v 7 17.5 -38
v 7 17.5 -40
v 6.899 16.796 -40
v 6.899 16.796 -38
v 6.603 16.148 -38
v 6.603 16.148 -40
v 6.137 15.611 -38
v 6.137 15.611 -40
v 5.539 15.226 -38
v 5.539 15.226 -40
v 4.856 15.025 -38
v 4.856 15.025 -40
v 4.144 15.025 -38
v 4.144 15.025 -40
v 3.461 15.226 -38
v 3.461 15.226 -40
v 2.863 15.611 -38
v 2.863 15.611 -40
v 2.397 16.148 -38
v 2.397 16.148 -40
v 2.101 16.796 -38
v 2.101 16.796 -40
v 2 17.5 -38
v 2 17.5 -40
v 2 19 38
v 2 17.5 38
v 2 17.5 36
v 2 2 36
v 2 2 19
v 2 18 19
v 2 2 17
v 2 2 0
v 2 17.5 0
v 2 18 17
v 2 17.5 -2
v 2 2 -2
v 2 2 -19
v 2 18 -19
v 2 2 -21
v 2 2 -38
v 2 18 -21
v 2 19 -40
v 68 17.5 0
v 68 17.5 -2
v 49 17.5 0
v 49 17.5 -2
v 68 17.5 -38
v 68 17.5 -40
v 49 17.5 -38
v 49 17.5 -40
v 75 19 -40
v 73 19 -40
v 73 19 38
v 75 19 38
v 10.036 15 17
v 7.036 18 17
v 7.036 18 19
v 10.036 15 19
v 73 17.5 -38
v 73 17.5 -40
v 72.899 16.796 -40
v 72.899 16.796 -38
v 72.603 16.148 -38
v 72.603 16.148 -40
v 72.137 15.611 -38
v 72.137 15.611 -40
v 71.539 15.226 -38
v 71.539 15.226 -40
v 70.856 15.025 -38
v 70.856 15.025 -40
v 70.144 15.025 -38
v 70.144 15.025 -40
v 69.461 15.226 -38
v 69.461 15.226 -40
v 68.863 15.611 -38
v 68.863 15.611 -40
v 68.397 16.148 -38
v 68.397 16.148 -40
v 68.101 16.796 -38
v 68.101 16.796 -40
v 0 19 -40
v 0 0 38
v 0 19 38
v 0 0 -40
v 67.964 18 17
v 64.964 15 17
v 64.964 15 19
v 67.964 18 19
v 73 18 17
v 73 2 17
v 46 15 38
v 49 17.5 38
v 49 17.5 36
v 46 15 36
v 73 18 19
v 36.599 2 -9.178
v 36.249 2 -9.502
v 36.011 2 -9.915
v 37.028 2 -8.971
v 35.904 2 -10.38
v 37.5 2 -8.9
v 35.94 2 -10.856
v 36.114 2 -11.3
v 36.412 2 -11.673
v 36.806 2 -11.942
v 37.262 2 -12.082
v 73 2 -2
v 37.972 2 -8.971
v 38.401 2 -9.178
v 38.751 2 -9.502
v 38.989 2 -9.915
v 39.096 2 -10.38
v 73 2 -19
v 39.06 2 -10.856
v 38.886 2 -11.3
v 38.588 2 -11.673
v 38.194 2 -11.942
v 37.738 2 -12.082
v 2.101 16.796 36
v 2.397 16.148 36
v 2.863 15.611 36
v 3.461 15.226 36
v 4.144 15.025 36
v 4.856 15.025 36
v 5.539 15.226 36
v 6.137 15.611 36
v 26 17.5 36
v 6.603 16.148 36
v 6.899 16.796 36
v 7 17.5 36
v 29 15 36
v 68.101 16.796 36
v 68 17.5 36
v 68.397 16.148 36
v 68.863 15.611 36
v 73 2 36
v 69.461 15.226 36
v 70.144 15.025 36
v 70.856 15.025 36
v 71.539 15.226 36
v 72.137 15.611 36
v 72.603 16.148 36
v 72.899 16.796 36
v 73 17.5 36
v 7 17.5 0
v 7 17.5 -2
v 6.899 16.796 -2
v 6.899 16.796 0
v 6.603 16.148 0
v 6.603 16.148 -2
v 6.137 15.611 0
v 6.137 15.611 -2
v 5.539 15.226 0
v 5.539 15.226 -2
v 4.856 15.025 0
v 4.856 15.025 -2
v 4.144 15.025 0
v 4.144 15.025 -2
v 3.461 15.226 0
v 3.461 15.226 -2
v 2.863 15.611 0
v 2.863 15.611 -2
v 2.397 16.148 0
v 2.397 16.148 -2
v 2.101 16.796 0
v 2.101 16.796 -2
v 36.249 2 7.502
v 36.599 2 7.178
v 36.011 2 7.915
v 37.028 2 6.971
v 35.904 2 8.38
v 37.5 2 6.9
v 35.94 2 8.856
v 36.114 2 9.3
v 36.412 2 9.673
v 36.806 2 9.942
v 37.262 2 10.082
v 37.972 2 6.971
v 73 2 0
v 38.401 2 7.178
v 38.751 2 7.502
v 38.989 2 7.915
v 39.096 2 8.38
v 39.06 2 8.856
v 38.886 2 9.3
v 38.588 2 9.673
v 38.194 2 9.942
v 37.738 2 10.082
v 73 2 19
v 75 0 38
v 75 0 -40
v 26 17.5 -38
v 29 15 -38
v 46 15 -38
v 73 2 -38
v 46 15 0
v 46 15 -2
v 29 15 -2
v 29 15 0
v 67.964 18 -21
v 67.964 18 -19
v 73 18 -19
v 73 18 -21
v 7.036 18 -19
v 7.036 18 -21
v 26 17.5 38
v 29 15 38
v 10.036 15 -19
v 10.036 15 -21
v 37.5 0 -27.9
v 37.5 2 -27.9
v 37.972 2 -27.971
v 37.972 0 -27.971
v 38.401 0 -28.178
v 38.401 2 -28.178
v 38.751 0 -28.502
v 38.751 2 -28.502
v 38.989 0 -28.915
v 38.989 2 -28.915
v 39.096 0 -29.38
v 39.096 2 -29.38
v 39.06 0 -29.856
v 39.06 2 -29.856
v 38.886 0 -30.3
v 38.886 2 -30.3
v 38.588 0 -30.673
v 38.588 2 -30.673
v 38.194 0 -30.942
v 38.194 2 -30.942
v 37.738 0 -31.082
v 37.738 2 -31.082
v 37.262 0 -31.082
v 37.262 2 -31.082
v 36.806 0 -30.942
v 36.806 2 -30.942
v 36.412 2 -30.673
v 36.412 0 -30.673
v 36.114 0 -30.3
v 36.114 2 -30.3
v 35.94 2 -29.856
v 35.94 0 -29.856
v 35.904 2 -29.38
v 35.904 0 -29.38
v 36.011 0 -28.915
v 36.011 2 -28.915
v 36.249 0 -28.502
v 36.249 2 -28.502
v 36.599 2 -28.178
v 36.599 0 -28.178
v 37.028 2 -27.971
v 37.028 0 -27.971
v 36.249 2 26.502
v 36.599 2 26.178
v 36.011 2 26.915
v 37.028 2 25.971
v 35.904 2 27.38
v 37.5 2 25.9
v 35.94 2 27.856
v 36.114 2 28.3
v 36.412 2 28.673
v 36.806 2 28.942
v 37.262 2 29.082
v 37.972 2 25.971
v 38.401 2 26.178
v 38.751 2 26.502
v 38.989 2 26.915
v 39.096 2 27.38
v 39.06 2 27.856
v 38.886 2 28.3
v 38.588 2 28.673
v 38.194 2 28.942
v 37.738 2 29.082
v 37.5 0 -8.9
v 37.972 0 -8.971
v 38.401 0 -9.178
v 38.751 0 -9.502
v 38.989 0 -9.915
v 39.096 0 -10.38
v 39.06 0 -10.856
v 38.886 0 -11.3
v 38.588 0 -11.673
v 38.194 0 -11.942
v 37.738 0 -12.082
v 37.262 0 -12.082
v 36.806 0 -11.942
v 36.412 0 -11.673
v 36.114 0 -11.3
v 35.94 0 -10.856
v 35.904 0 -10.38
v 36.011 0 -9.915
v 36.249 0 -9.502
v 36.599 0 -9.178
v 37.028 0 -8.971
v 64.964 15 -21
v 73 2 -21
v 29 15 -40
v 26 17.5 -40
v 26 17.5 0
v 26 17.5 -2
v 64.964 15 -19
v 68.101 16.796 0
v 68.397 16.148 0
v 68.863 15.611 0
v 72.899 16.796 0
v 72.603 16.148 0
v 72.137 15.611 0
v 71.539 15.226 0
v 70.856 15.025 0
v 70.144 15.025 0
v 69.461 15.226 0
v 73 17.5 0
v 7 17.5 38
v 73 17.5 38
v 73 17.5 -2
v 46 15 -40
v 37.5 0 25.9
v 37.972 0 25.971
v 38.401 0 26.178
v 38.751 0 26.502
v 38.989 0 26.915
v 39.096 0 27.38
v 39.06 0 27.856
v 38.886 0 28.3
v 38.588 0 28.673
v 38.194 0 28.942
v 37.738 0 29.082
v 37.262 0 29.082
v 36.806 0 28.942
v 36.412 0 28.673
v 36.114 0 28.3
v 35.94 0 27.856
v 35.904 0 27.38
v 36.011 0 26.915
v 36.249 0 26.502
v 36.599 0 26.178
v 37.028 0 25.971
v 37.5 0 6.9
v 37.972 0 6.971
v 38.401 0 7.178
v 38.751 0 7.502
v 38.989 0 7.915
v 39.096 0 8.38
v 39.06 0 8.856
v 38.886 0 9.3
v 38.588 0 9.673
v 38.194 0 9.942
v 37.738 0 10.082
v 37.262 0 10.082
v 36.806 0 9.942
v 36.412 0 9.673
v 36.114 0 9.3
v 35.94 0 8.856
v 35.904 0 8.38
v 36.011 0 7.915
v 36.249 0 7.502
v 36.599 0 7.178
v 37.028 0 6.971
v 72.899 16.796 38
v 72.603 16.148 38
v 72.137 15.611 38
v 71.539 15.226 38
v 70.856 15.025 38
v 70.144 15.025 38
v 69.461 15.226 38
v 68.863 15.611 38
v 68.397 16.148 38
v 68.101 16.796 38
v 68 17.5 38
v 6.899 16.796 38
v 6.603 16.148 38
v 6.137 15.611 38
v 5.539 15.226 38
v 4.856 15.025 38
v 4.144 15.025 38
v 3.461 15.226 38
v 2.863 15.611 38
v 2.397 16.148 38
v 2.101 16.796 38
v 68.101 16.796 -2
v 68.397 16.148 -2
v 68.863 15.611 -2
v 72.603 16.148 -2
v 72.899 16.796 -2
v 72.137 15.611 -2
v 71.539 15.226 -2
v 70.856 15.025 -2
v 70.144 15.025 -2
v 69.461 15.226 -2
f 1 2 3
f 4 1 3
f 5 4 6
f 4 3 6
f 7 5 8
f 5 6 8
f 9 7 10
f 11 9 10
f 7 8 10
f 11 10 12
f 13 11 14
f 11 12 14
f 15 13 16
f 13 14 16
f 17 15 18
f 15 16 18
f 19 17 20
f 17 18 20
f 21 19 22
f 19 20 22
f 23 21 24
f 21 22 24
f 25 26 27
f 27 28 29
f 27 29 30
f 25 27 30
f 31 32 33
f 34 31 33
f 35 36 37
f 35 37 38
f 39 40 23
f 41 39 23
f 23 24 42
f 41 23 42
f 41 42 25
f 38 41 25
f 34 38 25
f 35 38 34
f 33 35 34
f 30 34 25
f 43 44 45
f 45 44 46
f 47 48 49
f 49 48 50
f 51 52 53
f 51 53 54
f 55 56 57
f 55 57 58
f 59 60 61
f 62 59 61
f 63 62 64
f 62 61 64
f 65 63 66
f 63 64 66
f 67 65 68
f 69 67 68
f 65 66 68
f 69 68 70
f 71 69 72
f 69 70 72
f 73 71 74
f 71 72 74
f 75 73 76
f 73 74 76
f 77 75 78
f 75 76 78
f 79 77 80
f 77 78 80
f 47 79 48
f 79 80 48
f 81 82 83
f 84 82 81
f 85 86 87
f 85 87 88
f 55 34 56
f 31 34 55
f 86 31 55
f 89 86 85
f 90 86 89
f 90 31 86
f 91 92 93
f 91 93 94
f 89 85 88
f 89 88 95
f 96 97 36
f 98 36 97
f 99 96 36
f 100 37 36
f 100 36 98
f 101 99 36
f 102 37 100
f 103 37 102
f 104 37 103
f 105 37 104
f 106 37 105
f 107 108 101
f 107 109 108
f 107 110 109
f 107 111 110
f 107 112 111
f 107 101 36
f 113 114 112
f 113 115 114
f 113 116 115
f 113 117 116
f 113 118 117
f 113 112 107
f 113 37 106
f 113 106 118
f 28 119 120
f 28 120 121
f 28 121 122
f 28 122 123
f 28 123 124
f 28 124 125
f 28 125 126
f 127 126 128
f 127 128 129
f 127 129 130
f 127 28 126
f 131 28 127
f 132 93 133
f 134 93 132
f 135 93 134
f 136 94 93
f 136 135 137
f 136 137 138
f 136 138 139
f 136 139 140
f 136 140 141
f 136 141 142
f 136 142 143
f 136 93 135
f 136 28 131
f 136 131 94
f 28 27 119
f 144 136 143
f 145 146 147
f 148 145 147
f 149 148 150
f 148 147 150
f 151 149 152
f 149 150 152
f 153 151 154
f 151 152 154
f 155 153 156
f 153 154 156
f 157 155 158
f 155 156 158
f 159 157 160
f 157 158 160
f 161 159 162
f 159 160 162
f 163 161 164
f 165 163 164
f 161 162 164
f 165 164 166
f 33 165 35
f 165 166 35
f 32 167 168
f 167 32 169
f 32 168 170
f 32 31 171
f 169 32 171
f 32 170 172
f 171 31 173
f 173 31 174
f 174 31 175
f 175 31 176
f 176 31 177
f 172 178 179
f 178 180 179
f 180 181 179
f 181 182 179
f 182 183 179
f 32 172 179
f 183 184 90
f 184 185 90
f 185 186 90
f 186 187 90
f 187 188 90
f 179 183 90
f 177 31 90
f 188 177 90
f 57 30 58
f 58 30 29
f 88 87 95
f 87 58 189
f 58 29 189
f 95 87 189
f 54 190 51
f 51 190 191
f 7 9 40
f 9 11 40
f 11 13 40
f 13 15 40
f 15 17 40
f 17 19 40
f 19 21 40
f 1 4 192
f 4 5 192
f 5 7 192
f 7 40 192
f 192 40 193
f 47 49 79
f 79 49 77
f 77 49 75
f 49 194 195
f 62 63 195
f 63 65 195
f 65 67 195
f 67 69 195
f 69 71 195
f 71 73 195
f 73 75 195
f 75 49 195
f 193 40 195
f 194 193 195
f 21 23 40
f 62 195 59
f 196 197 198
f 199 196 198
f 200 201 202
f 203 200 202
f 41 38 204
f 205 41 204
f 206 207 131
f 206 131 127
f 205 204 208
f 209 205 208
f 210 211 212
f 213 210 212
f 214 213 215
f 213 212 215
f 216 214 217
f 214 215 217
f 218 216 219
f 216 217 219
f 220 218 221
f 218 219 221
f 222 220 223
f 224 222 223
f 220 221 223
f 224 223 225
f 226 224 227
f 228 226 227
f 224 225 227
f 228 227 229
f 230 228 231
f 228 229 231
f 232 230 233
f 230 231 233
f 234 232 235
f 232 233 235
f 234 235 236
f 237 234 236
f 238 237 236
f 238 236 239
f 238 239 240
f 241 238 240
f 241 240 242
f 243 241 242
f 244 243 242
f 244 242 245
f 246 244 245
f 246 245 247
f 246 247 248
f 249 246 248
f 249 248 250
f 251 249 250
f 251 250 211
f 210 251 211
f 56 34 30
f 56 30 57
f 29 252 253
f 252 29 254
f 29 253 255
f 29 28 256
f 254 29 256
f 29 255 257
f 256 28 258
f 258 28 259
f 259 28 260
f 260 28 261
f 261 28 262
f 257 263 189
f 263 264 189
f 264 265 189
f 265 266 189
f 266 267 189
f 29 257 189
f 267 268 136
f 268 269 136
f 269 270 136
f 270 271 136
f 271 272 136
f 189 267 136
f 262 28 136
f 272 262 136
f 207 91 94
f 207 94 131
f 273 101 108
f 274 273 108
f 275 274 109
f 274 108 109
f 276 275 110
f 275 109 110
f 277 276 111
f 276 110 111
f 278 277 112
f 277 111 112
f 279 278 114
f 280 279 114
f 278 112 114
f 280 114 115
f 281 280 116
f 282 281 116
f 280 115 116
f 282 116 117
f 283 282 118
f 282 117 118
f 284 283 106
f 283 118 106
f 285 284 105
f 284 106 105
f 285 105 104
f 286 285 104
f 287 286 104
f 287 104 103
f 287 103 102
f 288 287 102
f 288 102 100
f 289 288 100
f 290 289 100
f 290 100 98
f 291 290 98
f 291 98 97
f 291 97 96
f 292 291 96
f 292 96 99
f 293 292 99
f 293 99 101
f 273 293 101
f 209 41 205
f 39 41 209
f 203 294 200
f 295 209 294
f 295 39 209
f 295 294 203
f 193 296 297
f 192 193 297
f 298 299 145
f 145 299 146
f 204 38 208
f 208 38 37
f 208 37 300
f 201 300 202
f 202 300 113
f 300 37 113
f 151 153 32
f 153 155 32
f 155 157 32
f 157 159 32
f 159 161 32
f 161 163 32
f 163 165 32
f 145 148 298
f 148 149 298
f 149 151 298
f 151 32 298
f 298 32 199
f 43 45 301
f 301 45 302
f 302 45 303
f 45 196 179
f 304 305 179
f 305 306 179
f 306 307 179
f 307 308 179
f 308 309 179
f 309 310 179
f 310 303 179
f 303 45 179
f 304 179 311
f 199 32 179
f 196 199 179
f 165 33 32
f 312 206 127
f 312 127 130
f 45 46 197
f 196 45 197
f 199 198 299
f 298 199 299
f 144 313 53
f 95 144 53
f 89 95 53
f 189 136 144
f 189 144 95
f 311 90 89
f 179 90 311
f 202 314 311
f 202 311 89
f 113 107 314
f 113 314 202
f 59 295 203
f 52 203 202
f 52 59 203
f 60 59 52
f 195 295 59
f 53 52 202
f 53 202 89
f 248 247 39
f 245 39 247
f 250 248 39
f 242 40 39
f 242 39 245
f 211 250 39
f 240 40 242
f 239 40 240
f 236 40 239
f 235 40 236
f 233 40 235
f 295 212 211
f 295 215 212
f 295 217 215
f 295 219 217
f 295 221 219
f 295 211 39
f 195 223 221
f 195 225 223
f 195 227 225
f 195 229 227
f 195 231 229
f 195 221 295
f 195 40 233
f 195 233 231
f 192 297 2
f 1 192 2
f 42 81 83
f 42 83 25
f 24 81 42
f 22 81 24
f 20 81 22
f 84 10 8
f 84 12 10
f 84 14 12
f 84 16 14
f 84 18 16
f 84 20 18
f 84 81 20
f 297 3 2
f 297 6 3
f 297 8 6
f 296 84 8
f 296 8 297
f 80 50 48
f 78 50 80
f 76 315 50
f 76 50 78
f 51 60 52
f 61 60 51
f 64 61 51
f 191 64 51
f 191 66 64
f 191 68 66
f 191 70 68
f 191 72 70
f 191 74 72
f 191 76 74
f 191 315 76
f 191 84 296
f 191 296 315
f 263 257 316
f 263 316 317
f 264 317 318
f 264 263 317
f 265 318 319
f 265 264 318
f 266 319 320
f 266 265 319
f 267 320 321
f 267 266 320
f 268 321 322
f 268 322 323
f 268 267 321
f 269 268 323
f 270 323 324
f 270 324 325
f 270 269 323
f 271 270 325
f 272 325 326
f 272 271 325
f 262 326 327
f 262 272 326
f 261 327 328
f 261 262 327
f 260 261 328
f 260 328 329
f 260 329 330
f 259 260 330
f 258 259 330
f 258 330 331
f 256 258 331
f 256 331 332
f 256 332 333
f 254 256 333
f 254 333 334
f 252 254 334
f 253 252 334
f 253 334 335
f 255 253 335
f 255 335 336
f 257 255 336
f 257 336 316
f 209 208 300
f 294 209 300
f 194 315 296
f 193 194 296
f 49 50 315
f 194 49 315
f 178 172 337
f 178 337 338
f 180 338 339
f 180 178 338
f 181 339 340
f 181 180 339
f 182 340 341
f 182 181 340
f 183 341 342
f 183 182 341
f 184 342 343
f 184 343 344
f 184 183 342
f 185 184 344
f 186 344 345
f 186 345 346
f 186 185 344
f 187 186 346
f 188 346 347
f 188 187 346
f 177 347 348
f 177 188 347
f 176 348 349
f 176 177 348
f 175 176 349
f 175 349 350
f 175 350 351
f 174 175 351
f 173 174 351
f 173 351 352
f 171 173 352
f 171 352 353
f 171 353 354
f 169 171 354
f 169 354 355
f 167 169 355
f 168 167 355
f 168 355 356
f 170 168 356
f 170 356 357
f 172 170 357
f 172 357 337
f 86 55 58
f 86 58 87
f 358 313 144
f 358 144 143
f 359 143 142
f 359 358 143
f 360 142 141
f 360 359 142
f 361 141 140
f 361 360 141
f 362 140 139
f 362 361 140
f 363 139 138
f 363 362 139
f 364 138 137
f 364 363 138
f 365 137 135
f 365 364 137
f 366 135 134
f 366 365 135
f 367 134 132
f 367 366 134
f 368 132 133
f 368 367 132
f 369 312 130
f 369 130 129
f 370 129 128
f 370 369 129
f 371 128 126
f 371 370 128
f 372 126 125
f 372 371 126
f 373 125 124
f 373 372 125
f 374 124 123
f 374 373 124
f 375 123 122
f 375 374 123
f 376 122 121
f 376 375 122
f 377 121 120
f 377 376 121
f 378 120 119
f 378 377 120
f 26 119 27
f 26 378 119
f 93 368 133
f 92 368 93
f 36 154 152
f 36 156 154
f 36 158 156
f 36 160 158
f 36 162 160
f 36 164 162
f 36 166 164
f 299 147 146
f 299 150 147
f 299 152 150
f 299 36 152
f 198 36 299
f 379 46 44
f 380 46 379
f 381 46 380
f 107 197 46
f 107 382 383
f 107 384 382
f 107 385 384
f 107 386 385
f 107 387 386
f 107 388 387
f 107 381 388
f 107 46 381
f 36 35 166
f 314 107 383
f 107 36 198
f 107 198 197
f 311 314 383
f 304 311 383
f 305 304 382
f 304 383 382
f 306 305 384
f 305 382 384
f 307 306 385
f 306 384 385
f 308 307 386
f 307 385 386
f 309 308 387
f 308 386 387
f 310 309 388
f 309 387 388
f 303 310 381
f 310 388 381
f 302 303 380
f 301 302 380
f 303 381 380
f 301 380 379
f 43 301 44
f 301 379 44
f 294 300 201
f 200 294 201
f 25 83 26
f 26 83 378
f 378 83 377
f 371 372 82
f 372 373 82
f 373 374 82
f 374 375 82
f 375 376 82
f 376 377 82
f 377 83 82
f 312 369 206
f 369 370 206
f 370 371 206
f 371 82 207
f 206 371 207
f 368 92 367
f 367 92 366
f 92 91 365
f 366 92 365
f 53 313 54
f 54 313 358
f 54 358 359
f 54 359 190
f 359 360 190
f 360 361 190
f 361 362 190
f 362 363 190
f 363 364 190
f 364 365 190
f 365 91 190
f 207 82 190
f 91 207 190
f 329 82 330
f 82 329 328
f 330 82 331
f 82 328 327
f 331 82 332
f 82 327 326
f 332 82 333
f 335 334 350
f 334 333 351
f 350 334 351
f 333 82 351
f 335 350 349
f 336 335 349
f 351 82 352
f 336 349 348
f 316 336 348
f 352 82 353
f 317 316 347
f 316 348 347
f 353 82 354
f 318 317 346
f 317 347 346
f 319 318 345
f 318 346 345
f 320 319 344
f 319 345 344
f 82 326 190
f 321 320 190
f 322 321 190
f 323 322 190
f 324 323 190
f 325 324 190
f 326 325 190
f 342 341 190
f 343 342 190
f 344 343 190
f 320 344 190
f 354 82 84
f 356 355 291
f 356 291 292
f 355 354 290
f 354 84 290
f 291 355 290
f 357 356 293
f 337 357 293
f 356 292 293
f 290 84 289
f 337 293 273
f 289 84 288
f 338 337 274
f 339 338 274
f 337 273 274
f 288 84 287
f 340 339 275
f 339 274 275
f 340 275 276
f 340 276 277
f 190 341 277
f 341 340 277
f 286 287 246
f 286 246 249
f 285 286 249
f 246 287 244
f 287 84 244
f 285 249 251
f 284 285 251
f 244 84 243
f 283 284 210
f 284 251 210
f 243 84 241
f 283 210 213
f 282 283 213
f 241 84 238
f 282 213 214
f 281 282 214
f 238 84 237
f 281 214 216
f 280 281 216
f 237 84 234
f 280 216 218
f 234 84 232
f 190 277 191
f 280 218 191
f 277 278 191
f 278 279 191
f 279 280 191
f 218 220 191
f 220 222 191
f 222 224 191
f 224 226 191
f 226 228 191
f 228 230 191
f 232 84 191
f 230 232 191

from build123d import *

# Parameters (mm, degrees)
SKETCH1_W            = 75
SKETCH1_H            = 40
BOSS_EXTRUDE1_DEPTH  = 2
SKETCH2_W            = 75
SKETCH2_H            = 40
SKETCH2_W_2          = 71
SKETCH2_H_2          = 17
BOSS_EXTRUDE2_DEPTH  = 17
CUT_EXTRUDE2_DEPTH   = 17
CUT_EXTRUDE3_REACH   = 82.169
CUT_EXTRUDE4_REACH   = 88.683
SKETCH5_R            = 1.6
MIRROR2_COPY_1_DEPTH = 17


with BuildPart() as part:
    # Sketch1 → Boss-Extrude1 (new body)
    with BuildSketch(Plane(origin=(0, 0, 0), x_dir=(1, 0, 0), z_dir=(0, 1, 0))):
        with Locations((37.5, 20)):
            Rectangle(SKETCH1_W, SKETCH1_H)
    boss_extrude1 = extrude(amount=BOSS_EXTRUDE1_DEPTH)

    # Sketch2 → Boss-Extrude2 (add)
    with BuildSketch(Plane(origin=(0, 2, 0), x_dir=(1, 0, 0), z_dir=(0, 1, 0))):
        with Locations((37.5, 20)):
            Rectangle(SKETCH2_W, SKETCH2_H)
        with Locations((37.5, 29.5)):
            Rectangle(SKETCH2_W_2, SKETCH2_H_2, mode=Mode.SUBTRACT)
        with Locations((37.5, 10.5)):
            Rectangle(SKETCH2_W_2, SKETCH2_H_2, mode=Mode.SUBTRACT)
    boss_extrude2 = extrude(amount=BOSS_EXTRUDE2_DEPTH)

    # Sketch3 → Cut-Extrude2 (cut)
    with BuildSketch(Plane.XY):
        with BuildLine():
            Line((2, 17.5), (2, 19))
            Line((2, 19), (73, 19))
            Line((73, 19), (73, 17.5))
            ThreePointArc((73, 17.5), (70.5, 15), (68, 17.5))
            Line((68, 17.5), (49, 17.5))
            Line((49, 17.5), (46, 15))
            Line((46, 15), (29, 15))
            Line((29, 15), (26, 17.5))
            Line((26, 17.5), (7, 17.5))
            ThreePointArc((7, 17.5), (4.5, 15), (2, 17.5))
        make_face()
    cut_extrude2 = extrude(amount=-CUT_EXTRUDE2_DEPTH, mode=Mode.SUBTRACT)

    # Mirror1: Cut-Extrude2 across plane
    add(cut_extrude2.mirror(Plane.XY.offset(-20)), mode=Mode.SUBTRACT)

    # Sketch4 → Cut-Extrude3 (cut, up to next)
    with BuildSketch(Plane.XY.offset(-19), mode=Mode.PRIVATE) as cut_extrude3_sk1:
        Polygon((2, 18), (7.035918341, 18), (10.035918341, 15), (64.964081659, 15), (67.964081659, 18), (73, 18), (73, 19), (2, 19), align=None)
    cut_extrude3_tool1 = extrude(cut_extrude3_sk1.sketch, amount=-CUT_EXTRUDE3_REACH, mode=Mode.PRIVATE) & part.part
    cut_extrude3 = cut_extrude3_tool1.solids().sort_by_distance((37.5, 17.098486, -19))[0]
    add(cut_extrude3, mode=Mode.SUBTRACT)

    # Sketch5 → Cut-Extrude4 (cut, up to next)
    with BuildSketch(Plane(origin=(0, 2, 0), x_dir=(1, 0, 0), z_dir=(0, 1, 0)), mode=Mode.PRIVATE) as cut_extrude4_sk1:
        with Locations(Location((37.5, 29.5, 0), (0, 0, 270))):
            Circle(SKETCH5_R)
    cut_extrude4_tool1 = extrude(cut_extrude4_sk1.sketch, amount=-CUT_EXTRUDE4_REACH, mode=Mode.PRIVATE) & part.part
    # Sketch5 → Cut-Extrude4 (cut, up to next)
    with BuildSketch(Plane(origin=(0, 2, 0), x_dir=(1, 0, 0), z_dir=(0, 1, 0)), mode=Mode.PRIVATE) as cut_extrude4_sk2:
        with Locations(Location((37.5, 10.5, 0), (0, 0, 270))):
            Circle(SKETCH5_R)
    cut_extrude4_tool2 = extrude(cut_extrude4_sk2.sketch, amount=-CUT_EXTRUDE4_REACH, mode=Mode.PRIVATE) & part.part
    cut_extrude4_1 = cut_extrude4_tool1.solids().sort_by_distance((37.5, 2, -29.5))[0]
    add(cut_extrude4_1, mode=Mode.SUBTRACT)
    cut_extrude4_2 = cut_extrude4_tool2.solids().sort_by_distance((37.5, 2, -10.5))[0]
    add(cut_extrude4_2, mode=Mode.SUBTRACT)
    cut_extrude4 = cut_extrude4_1 + cut_extrude4_2  # Cut-Extrude4 as one shape, for the pattern or mirror that repeats it

    # Mirror2: Boss-Extrude1, Boss-Extrude2, Cut-Extrude2, Cut-Extrude3, Cut-Extrude4 across plane
    add(boss_extrude1.mirror(Plane.XY.offset(-1)))
    add(boss_extrude2.mirror(Plane.XY.offset(-1)))
    add(cut_extrude2.mirror(Plane.XY.offset(-1)), mode=Mode.SUBTRACT)
    add(cut_extrude3.mirror(Plane.XY.offset(-1)), mode=Mode.SUBTRACT)
    add(cut_extrude4.mirror(Plane.XY.offset(-1)), mode=Mode.SUBTRACT)

    # Mirror2 copy 1 sketch → Mirror2 copy 1 (cut)
    with BuildSketch(Plane.XY.offset(38)):
        with BuildLine():
            Line((2, 17.5), (2, 19))
            Line((2, 19), (73, 19))
            Line((73, 19), (73, 17.5))
            ThreePointArc((73, 17.5), (70.5, 15), (68, 17.5))
            Line((68, 17.5), (49, 17.5))
            Line((49, 17.5), (46, 15))
            Line((46, 15), (29, 15))
            Line((29, 15), (26, 17.5))
            Line((26, 17.5), (7, 17.5))
            ThreePointArc((7, 17.5), (4.5, 15), (2, 17.5))
        make_face()
    extrude(amount=-MIRROR2_COPY_1_DEPTH, mode=Mode.SUBTRACT)


solid = part.part
